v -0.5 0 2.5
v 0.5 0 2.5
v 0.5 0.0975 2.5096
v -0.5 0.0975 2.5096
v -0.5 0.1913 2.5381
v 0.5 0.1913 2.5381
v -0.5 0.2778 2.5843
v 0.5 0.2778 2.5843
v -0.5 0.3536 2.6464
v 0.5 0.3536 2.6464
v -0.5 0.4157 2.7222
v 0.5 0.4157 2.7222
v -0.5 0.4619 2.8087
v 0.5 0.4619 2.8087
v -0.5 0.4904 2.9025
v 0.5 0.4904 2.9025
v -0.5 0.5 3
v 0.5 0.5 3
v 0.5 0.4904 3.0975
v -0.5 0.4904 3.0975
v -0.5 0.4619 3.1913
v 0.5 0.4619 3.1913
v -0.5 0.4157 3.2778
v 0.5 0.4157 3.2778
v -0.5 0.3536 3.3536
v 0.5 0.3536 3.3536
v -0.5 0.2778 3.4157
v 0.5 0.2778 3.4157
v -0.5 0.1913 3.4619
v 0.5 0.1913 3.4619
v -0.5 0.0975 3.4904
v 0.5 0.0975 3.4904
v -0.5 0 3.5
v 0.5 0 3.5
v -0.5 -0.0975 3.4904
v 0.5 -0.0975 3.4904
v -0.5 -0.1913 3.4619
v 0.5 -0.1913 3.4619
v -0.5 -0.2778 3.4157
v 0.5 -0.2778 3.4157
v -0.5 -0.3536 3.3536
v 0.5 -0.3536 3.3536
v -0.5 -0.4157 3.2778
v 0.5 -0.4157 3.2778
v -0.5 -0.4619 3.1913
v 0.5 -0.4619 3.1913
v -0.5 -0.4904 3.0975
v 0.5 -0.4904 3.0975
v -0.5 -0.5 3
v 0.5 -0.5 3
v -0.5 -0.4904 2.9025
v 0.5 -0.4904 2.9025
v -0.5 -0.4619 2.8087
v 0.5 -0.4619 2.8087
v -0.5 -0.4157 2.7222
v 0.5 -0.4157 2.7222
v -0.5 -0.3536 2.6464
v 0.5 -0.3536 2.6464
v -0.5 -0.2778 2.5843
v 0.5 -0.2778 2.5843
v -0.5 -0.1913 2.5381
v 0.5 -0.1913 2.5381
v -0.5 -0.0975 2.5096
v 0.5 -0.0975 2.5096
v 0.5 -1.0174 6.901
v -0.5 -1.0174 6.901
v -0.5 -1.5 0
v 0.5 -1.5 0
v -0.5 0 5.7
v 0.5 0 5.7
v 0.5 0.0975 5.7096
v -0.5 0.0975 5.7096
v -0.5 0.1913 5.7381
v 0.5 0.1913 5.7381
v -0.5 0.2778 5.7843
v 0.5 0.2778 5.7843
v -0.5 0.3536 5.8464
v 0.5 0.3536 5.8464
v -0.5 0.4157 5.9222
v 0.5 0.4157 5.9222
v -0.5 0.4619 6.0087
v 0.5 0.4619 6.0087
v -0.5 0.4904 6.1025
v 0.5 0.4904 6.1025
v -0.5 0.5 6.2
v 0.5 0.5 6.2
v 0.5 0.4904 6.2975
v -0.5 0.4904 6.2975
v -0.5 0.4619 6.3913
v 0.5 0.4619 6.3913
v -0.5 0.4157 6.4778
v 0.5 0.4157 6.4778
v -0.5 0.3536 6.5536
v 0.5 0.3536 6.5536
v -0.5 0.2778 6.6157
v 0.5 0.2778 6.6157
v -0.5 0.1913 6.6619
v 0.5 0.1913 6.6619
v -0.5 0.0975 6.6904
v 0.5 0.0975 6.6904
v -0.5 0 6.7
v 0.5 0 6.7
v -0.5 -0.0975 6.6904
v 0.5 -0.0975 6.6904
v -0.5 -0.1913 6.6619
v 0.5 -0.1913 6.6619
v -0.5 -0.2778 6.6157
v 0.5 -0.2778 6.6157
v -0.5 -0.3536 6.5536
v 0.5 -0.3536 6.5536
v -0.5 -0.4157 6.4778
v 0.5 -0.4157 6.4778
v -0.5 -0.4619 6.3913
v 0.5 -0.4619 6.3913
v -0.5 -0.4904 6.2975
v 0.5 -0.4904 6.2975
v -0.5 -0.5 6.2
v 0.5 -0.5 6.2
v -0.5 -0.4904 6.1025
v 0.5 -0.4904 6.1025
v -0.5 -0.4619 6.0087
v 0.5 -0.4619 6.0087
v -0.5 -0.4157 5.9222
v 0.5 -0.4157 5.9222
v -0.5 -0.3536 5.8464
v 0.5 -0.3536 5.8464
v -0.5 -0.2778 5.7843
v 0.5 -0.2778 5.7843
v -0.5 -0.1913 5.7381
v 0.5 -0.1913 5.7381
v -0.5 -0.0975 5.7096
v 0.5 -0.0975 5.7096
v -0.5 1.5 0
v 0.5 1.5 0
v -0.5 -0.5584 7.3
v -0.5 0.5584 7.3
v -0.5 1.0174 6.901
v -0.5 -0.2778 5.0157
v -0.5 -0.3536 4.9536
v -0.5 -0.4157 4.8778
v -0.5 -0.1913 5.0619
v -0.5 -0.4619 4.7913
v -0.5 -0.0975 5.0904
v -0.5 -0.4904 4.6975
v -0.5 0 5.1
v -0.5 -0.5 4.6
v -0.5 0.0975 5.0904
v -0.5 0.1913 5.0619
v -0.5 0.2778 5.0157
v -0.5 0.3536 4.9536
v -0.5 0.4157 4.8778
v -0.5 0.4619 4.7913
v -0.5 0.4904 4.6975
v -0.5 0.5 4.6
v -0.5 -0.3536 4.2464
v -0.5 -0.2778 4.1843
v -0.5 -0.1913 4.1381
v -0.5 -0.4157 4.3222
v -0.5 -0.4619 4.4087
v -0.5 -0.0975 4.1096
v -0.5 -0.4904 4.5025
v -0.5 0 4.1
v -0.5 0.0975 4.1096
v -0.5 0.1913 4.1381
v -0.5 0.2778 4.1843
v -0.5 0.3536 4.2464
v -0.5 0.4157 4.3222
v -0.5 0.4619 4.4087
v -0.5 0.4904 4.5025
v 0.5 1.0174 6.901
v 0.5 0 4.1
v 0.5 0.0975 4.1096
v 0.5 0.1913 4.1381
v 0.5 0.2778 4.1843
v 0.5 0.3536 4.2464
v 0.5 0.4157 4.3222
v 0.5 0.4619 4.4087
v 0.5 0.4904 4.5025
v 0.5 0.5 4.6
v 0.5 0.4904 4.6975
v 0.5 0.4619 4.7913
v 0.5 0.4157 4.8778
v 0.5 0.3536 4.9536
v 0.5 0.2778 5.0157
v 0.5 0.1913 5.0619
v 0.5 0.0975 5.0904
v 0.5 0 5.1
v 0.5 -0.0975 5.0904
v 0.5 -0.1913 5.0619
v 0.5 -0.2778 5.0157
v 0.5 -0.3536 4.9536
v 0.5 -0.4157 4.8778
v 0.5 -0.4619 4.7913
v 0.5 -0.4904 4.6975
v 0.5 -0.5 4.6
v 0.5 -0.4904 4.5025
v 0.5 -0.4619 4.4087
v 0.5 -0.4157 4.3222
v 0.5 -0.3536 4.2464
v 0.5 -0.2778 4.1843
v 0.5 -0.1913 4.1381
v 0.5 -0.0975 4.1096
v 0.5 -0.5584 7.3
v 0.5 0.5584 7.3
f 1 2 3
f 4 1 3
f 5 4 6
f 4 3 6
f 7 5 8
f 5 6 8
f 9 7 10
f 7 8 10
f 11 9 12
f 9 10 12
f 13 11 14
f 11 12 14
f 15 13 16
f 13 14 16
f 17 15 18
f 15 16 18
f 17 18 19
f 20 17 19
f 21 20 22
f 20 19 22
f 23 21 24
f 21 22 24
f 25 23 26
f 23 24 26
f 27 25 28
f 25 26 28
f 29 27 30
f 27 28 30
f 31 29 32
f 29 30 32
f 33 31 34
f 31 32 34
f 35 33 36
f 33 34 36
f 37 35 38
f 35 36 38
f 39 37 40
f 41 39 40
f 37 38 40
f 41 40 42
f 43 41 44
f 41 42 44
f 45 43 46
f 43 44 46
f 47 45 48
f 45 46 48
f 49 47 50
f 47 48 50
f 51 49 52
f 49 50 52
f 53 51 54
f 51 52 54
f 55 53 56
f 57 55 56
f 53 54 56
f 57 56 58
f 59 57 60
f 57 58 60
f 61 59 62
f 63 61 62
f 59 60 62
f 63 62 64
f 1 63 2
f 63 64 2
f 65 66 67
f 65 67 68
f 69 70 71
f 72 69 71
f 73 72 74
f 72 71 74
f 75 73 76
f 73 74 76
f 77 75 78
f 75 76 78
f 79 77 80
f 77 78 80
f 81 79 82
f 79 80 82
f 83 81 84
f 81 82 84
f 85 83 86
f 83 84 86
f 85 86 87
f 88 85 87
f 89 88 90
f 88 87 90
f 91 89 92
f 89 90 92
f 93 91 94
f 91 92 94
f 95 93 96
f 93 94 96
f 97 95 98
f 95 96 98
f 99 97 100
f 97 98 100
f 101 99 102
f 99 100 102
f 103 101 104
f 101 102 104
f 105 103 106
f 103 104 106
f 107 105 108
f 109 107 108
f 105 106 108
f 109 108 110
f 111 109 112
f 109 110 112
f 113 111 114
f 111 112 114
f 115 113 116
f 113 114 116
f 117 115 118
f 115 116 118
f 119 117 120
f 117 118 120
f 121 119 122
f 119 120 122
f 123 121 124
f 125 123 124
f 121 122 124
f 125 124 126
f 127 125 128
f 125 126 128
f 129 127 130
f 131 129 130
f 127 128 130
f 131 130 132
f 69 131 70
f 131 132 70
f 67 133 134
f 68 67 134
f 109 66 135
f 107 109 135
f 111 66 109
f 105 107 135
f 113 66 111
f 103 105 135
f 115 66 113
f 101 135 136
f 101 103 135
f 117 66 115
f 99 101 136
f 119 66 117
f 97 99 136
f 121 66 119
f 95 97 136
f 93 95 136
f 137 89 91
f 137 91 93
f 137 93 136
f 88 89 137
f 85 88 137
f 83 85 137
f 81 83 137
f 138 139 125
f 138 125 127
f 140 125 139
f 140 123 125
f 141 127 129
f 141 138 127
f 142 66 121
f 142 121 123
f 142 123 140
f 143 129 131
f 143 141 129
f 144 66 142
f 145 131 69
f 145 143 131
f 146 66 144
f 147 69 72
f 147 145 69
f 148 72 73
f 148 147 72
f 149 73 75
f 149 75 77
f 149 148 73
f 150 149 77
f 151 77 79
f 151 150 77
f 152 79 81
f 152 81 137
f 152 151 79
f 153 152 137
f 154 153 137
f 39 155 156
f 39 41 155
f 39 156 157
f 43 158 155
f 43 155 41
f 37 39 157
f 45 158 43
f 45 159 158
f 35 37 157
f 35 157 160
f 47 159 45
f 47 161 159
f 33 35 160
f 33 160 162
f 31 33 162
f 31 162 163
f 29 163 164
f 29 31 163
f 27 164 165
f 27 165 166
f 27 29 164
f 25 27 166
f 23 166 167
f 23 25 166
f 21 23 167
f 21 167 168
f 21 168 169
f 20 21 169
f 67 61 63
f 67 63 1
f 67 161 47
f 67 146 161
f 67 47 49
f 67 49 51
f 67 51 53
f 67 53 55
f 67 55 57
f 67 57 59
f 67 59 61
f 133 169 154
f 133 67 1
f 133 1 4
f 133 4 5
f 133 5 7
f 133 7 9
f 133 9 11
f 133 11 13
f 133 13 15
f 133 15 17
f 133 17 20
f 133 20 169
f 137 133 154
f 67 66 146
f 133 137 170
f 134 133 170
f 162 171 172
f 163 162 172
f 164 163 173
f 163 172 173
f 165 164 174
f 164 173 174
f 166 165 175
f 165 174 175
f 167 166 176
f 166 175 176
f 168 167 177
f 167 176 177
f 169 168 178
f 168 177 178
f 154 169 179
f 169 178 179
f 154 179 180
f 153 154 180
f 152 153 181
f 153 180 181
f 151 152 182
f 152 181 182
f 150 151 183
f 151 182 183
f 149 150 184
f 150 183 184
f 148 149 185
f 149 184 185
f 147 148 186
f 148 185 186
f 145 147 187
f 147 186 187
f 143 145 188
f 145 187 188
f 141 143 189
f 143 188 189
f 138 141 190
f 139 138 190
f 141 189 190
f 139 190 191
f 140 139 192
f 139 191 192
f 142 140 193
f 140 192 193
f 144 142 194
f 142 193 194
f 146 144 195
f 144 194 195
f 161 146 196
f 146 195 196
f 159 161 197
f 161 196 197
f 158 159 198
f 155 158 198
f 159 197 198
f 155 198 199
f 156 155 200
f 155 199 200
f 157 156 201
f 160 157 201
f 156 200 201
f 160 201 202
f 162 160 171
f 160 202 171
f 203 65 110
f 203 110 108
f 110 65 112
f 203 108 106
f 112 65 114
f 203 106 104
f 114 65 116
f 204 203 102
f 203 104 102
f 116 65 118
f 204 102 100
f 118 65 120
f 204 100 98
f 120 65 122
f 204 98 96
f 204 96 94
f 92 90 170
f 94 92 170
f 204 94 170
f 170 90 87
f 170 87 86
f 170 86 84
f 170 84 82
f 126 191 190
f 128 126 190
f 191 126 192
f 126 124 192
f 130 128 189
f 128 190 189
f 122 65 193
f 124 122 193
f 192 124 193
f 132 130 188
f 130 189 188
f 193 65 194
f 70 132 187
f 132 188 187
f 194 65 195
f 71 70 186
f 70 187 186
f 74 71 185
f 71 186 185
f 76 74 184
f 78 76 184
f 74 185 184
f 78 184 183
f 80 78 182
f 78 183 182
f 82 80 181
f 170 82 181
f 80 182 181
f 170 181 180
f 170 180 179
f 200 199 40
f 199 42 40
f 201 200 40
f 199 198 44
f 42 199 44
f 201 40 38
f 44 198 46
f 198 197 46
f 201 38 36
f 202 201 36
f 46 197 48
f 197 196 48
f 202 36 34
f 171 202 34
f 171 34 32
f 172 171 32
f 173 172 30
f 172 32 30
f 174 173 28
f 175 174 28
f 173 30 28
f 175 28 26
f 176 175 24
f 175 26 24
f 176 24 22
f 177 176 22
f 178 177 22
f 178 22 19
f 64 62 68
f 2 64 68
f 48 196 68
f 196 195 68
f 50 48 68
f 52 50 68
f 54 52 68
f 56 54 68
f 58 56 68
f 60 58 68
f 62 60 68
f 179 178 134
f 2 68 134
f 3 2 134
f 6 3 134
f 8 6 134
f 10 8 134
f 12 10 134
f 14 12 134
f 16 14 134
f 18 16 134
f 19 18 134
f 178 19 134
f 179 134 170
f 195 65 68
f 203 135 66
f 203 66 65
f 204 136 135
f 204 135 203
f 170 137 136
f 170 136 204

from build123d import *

# Parameters (mm, degrees)
ESBO_O1_W                = 1
ESBO_O1_H                = 3
RESSALTO_EXTRUS_O1_DEPTH = 7.3
INCLINA_O2_ANGLE         = -4
CHANFRO1_SIZE2           = 0.431123878
CHANFRO1_SIZE            = 0.4
CHANFRO1_EDGE_2_SIZE2    = 0.4
CHANFRO1_EDGE_2_SIZE     = 0.431123878
ESBO_O2_R                = 0.5
CORTE_EXTRUS_O1_DEPTH    = 1


with BuildPart() as part:
    # Esboço1 → Ressalto-extrusão1 (new body)
    with BuildSketch(Plane.XY):
        Rectangle(ESBO_O1_W, ESBO_O1_H)
    extrude(amount=RESSALTO_EXTRUS_O1_DEPTH)

    # Inclinação2
    inclina_o2_faces = [part.faces().sort_by_distance(p)[0] for p in [
        (0, 1.5, 3.65),
        (0, -1.5, 3.65),
    ]]
    draft(inclina_o2_faces, Plane(origin=(0, 0, 0), x_dir=(-1, 0, 0), z_dir=(0, 0, -1)), INCLINA_O2_ANGLE)

    # Chanfro1
    chanfro1_edges = [part.edges().sort_by_distance(p)[0] for p in [
        (0, -0.989534273, 7.3),
    ]]
    chamfer(chanfro1_edges, length=CHANFRO1_SIZE, length2=CHANFRO1_SIZE2)

    # Chanfro1 edge 2
    chanfro1_edge_2_edges = [part.edges().sort_by_distance(p)[0] for p in [
        (0, 0.989534273, 7.3),
    ]]
    chamfer(chanfro1_edge_2_edges, length=CHANFRO1_EDGE_2_SIZE, length2=CHANFRO1_EDGE_2_SIZE2)

    # Esboço2 → Corte-extrusão1 (cut)
    with BuildSketch(Plane(origin=(0.5, 0, 0), x_dir=(0, 0, -1), z_dir=(1, 0, 0))):
        with Locations((-6.2, 0)):
            Circle(ESBO_O2_R)
        with Locations((-4.6, 0)):
            Circle(ESBO_O2_R)
        with Locations((-3, 0)):
            Circle(ESBO_O2_R)
    extrude(amount=-CORTE_EXTRUS_O1_DEPTH, mode=Mode.SUBTRACT)


solid = part.part
